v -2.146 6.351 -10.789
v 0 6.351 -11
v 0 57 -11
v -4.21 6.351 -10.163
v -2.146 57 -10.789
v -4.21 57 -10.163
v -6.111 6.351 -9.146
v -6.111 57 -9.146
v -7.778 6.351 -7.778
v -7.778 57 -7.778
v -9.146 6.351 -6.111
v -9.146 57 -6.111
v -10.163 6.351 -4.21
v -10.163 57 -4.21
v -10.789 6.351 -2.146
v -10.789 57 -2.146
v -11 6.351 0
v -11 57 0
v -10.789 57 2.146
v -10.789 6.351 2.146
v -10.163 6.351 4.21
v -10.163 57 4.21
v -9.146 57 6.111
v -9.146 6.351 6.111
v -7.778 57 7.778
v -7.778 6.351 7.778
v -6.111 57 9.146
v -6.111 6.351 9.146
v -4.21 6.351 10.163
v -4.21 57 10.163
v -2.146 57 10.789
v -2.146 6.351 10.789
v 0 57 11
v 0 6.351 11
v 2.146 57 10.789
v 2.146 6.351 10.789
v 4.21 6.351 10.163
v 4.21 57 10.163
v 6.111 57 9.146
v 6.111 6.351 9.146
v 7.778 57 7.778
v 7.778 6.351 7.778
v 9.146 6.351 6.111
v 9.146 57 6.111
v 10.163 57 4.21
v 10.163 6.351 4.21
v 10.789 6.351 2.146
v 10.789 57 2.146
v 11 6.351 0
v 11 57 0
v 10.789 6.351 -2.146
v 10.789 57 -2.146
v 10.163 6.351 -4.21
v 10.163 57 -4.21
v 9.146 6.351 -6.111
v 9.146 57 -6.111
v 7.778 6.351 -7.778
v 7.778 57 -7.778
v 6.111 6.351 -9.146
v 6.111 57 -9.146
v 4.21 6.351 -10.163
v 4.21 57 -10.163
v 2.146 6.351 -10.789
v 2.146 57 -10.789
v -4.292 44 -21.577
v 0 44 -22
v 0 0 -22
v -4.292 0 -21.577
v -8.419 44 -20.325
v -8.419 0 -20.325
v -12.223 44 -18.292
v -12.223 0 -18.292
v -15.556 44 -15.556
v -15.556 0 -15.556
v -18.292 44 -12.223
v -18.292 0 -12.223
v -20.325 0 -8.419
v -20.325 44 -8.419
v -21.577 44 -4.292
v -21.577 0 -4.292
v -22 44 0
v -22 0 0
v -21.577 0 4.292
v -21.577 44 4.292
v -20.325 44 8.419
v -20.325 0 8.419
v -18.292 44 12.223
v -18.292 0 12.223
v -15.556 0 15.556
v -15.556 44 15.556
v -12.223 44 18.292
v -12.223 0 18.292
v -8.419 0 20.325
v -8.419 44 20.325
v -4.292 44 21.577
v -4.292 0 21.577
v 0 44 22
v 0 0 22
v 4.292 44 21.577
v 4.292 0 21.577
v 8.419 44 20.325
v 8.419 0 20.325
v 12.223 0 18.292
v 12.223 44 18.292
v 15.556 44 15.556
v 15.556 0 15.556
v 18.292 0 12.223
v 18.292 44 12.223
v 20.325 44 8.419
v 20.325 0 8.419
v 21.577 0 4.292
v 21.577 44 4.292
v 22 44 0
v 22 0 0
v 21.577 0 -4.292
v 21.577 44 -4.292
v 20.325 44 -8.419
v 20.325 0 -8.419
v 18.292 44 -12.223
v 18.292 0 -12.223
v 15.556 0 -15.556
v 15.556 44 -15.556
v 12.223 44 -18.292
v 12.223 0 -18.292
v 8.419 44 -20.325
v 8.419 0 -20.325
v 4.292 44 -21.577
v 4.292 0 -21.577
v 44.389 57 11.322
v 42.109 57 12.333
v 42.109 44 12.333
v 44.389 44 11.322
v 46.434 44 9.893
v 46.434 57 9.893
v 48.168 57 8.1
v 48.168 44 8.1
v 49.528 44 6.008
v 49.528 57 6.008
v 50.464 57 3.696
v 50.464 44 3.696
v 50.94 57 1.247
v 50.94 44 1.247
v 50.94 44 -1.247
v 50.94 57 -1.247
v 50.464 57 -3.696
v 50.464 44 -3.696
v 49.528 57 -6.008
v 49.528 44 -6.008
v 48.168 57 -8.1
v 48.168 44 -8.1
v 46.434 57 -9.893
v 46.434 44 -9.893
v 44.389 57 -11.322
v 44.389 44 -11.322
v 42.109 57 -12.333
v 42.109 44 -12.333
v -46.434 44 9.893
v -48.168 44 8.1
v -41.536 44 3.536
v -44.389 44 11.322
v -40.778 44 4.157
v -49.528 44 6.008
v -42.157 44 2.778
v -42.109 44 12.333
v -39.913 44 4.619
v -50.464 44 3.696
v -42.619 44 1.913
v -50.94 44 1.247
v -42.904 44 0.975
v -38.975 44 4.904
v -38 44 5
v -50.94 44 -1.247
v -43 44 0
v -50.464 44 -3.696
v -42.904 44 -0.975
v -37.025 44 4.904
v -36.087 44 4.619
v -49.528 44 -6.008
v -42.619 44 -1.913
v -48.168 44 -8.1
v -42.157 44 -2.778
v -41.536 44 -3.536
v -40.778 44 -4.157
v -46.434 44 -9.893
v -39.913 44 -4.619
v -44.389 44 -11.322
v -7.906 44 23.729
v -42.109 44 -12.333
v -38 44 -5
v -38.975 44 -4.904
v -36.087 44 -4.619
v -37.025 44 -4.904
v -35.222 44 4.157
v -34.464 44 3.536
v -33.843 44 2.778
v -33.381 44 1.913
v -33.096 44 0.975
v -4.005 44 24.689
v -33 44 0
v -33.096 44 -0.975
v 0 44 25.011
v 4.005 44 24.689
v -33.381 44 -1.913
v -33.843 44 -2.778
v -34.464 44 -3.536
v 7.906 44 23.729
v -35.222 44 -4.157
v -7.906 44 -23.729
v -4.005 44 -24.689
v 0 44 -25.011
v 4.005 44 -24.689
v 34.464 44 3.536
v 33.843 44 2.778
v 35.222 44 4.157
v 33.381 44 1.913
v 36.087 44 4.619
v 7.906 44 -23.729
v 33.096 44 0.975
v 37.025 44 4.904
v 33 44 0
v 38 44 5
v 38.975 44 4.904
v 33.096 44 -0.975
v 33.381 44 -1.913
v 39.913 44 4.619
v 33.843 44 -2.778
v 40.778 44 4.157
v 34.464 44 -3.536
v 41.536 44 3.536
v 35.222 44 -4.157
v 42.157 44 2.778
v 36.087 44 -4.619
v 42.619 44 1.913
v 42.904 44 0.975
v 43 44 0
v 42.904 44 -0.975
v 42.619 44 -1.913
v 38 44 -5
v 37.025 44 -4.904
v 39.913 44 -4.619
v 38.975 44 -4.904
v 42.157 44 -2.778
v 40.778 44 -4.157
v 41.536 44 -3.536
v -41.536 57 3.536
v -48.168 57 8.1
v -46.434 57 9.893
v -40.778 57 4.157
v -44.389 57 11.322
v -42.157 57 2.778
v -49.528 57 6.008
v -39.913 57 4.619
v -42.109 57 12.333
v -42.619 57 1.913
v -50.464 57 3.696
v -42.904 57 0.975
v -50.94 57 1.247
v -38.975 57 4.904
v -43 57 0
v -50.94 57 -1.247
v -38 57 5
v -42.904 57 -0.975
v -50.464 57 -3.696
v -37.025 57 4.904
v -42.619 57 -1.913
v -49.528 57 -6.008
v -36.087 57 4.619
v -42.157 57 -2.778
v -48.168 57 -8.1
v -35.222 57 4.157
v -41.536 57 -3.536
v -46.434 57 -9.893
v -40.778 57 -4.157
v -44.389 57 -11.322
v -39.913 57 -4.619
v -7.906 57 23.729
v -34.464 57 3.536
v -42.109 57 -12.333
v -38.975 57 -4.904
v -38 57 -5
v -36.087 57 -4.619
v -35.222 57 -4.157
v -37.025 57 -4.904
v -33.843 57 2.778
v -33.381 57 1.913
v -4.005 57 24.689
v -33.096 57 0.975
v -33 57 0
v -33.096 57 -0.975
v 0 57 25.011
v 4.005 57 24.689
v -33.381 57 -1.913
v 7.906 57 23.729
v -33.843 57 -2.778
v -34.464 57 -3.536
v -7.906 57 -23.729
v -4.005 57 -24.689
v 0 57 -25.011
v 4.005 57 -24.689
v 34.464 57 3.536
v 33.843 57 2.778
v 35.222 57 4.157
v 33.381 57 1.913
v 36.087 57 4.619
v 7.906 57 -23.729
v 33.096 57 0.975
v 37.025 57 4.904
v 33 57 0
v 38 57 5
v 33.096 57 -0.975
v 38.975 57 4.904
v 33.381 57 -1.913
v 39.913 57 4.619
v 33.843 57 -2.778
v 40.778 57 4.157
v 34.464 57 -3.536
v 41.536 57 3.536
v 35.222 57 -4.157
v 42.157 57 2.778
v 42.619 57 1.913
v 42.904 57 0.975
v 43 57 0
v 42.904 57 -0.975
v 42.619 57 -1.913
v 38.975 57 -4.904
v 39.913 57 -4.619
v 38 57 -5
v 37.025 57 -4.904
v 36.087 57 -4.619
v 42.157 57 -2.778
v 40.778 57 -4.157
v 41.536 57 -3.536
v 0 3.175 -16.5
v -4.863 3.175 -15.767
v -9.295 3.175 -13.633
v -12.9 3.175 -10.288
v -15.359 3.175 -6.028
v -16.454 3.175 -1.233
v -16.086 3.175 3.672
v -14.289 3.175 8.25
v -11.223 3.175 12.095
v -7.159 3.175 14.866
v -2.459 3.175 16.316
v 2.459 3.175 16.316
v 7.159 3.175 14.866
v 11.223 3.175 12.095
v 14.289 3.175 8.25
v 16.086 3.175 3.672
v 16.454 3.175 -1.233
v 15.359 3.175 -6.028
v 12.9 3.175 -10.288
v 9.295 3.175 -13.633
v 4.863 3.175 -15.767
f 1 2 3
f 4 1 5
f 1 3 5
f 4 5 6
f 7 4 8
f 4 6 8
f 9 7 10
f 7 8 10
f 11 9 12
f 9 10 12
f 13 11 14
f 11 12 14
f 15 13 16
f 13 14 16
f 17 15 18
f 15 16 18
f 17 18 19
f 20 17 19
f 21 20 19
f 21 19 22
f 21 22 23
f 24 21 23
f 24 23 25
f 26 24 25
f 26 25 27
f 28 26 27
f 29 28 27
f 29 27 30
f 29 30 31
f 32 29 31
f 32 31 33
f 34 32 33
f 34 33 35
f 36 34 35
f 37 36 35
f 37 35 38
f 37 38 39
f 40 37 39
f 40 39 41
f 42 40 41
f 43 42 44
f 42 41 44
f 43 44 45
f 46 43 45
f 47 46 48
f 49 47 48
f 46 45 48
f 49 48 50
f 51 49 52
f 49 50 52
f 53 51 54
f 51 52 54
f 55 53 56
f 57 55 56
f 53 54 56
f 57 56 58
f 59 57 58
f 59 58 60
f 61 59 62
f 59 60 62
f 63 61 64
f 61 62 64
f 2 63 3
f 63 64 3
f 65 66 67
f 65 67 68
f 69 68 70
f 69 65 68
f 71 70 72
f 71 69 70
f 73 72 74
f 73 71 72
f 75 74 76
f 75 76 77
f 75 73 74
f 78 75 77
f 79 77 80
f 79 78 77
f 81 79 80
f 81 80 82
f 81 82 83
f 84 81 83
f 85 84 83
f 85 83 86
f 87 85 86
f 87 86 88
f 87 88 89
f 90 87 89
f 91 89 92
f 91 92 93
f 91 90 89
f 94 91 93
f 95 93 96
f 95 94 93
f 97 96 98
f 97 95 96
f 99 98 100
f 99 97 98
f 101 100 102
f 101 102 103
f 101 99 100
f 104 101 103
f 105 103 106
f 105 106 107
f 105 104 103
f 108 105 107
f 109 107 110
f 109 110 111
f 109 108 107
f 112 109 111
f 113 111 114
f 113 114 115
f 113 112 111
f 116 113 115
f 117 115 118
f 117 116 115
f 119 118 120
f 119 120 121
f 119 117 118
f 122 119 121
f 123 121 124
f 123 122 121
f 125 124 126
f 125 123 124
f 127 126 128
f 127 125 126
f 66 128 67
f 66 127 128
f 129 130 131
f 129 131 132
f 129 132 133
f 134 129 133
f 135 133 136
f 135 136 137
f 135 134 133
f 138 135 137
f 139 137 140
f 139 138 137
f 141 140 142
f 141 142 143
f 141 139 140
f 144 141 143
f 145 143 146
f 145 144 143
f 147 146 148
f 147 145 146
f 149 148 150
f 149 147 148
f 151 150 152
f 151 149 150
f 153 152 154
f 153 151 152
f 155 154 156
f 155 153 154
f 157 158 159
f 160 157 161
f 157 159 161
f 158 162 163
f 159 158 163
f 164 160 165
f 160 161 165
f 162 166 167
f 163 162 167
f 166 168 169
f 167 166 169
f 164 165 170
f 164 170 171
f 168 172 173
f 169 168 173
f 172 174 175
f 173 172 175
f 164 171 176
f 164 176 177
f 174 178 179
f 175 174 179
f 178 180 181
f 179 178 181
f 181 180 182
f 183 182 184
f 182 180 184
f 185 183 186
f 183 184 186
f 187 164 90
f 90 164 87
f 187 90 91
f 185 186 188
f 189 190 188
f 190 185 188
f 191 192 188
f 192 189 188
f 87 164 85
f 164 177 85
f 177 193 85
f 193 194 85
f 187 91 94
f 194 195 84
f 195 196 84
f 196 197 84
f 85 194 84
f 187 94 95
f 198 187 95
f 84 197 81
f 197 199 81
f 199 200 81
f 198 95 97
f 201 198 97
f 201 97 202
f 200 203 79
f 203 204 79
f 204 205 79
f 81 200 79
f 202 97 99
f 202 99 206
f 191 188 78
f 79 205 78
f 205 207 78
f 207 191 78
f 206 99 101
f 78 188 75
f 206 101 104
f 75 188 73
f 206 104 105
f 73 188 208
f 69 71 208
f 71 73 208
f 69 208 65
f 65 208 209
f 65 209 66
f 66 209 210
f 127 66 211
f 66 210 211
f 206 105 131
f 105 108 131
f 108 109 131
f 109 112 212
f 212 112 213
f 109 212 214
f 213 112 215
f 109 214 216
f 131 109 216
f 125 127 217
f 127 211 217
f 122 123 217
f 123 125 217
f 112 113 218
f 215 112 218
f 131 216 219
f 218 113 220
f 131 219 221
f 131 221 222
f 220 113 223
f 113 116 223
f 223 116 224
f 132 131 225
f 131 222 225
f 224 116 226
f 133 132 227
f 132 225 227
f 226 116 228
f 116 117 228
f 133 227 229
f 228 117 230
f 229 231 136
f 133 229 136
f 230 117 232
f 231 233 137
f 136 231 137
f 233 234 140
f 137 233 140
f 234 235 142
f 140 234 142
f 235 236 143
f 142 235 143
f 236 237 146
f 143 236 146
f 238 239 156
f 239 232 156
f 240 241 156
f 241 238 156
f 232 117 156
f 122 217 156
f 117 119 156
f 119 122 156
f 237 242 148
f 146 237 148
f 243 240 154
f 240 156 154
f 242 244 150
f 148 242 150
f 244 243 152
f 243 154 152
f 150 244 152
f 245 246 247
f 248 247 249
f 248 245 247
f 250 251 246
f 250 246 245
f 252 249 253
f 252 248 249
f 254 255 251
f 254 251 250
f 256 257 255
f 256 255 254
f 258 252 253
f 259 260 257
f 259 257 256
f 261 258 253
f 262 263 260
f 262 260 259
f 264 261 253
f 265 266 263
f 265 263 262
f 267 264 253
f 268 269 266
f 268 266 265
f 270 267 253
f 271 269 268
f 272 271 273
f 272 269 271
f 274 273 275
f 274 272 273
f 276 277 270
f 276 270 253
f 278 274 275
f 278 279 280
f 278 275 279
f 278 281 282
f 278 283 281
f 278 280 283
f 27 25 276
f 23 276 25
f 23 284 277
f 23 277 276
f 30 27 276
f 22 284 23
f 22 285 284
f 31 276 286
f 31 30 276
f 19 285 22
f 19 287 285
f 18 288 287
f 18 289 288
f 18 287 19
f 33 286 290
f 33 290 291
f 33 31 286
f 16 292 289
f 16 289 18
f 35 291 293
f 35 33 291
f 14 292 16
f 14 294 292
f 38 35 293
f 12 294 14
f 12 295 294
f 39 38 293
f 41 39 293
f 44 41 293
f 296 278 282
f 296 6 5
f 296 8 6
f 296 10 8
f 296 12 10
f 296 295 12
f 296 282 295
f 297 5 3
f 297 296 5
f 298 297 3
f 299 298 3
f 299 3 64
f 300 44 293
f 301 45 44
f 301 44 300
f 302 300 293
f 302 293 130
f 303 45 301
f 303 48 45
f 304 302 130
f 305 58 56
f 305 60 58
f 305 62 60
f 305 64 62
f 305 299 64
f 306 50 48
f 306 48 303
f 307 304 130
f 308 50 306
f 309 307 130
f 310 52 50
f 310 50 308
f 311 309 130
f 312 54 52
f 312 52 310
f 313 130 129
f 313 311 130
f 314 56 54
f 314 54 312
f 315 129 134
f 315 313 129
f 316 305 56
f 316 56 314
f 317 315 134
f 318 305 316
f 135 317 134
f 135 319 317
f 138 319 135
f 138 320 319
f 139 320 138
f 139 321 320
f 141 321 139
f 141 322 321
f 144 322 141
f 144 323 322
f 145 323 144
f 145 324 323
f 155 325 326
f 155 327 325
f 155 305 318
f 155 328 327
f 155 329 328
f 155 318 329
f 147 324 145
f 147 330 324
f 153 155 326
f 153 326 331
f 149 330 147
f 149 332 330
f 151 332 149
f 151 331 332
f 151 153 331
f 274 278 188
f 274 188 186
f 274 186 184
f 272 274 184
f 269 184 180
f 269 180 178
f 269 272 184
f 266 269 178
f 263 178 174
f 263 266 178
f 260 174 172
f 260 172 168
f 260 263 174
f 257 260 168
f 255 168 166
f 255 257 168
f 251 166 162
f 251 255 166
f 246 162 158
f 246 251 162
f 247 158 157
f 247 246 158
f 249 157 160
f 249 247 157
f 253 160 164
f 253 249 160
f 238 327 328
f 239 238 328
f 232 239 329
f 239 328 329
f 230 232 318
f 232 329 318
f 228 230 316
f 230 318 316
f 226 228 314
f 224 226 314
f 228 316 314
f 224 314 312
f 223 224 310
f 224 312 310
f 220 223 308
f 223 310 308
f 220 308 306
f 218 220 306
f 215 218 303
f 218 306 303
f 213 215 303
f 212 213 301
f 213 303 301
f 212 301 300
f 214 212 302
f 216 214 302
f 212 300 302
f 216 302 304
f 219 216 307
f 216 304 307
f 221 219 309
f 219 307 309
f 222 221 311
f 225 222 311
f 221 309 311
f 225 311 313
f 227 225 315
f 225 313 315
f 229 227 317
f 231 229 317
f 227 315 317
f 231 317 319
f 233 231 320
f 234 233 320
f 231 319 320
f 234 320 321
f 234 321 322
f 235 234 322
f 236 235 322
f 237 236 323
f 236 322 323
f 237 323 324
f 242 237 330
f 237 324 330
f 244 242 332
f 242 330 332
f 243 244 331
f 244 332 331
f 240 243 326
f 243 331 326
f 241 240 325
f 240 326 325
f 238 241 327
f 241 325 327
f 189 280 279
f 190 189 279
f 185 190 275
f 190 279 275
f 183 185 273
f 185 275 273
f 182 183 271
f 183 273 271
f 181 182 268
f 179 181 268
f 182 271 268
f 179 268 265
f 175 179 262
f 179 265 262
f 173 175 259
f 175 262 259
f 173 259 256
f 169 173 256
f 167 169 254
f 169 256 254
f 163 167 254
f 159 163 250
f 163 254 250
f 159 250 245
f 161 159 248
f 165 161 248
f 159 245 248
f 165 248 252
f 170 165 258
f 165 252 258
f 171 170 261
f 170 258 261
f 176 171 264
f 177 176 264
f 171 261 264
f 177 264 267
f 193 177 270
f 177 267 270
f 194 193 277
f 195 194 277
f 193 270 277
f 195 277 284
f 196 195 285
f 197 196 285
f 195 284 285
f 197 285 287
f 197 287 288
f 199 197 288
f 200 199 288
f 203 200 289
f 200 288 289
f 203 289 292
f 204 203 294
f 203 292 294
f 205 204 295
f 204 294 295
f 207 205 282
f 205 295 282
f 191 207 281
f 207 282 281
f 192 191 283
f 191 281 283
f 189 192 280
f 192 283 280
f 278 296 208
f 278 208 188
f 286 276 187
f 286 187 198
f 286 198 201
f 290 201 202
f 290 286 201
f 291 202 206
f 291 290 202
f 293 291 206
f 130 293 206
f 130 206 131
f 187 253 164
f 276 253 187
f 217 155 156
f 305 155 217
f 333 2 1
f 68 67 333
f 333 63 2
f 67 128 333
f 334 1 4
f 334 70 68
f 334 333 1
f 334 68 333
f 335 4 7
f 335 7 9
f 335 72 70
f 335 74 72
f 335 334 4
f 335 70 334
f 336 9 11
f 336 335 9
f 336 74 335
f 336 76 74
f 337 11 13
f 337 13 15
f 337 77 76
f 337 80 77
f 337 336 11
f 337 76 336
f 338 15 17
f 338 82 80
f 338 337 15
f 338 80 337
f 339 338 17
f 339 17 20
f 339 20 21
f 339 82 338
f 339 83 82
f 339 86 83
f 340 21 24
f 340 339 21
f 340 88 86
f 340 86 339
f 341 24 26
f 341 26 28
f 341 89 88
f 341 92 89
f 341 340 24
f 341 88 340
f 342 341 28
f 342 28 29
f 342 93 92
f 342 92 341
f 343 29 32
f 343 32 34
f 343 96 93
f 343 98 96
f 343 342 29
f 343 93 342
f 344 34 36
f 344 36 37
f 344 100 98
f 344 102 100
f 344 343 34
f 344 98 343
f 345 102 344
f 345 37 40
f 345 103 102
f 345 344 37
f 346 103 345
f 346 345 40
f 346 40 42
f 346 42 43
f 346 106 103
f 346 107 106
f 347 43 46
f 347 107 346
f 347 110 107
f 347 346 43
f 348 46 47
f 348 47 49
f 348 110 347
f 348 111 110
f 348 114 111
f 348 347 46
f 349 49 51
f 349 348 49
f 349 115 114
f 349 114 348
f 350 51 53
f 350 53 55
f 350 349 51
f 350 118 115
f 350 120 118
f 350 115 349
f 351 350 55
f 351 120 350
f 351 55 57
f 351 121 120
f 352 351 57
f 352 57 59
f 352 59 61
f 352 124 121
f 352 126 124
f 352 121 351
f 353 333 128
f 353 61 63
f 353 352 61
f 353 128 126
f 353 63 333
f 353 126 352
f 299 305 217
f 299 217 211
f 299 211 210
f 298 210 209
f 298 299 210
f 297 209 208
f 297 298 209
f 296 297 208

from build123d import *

# Parameters (mm, degrees)
SKETCH2_R           = 5
SKETCH2_R_2         = 11
BOSS_EXTRUDE2_DEPTH = 13


with BuildPart() as part:
    # Sketch1 → Revolve1 (revolve)
    with BuildSketch(Plane.XY):
        Polygon((-22, 0), (-22, 44), (-11, 44), (-11, 6.350852961), align=None)
    revolve(axis=Axis((0, 0, 0), (0, 1, 0)))

    # Sketch2 → Boss-Extrude2 (add)
    with BuildSketch(Plane(origin=(0, 44, 0), x_dir=(1, 0, 0), z_dir=(0, 1, 0))):
        with BuildLine():
            Line((7.905910187, -23.729102474), (42.109187711, -12.333473815))
            ThreePointArc((42.109187711, -12.333473815), (51, 0), (42.109187711, 12.333473815))
            Line((42.109187711, 12.333473815), (7.905910187, 23.729102474))
            ThreePointArc((7.905910187, 23.729102474), (0, 25.01147177), (-7.905910187, 23.729102474))
            Line((-7.905910187, 23.729102474), (-42.109187711, 12.333473815))
            ThreePointArc((-42.109187711, 12.333473815), (-51, 0), (-42.109187711, -12.333473815))
            Line((-42.109187711, -12.333473815), (-7.905910187, -23.729102474))
            ThreePointArc((-7.905910187, -23.729102474), (0, -25.01147177), (7.905910187, -23.729102474))
        make_face()
        with Locations((-38, 0)):
            Circle(SKETCH2_R, mode=Mode.SUBTRACT)
        with Locations((38, 0)):
            Circle(SKETCH2_R, mode=Mode.SUBTRACT)
        Circle(SKETCH2_R_2, mode=Mode.SUBTRACT)
    extrude(amount=BOSS_EXTRUDE2_DEPTH)


solid = part.part
